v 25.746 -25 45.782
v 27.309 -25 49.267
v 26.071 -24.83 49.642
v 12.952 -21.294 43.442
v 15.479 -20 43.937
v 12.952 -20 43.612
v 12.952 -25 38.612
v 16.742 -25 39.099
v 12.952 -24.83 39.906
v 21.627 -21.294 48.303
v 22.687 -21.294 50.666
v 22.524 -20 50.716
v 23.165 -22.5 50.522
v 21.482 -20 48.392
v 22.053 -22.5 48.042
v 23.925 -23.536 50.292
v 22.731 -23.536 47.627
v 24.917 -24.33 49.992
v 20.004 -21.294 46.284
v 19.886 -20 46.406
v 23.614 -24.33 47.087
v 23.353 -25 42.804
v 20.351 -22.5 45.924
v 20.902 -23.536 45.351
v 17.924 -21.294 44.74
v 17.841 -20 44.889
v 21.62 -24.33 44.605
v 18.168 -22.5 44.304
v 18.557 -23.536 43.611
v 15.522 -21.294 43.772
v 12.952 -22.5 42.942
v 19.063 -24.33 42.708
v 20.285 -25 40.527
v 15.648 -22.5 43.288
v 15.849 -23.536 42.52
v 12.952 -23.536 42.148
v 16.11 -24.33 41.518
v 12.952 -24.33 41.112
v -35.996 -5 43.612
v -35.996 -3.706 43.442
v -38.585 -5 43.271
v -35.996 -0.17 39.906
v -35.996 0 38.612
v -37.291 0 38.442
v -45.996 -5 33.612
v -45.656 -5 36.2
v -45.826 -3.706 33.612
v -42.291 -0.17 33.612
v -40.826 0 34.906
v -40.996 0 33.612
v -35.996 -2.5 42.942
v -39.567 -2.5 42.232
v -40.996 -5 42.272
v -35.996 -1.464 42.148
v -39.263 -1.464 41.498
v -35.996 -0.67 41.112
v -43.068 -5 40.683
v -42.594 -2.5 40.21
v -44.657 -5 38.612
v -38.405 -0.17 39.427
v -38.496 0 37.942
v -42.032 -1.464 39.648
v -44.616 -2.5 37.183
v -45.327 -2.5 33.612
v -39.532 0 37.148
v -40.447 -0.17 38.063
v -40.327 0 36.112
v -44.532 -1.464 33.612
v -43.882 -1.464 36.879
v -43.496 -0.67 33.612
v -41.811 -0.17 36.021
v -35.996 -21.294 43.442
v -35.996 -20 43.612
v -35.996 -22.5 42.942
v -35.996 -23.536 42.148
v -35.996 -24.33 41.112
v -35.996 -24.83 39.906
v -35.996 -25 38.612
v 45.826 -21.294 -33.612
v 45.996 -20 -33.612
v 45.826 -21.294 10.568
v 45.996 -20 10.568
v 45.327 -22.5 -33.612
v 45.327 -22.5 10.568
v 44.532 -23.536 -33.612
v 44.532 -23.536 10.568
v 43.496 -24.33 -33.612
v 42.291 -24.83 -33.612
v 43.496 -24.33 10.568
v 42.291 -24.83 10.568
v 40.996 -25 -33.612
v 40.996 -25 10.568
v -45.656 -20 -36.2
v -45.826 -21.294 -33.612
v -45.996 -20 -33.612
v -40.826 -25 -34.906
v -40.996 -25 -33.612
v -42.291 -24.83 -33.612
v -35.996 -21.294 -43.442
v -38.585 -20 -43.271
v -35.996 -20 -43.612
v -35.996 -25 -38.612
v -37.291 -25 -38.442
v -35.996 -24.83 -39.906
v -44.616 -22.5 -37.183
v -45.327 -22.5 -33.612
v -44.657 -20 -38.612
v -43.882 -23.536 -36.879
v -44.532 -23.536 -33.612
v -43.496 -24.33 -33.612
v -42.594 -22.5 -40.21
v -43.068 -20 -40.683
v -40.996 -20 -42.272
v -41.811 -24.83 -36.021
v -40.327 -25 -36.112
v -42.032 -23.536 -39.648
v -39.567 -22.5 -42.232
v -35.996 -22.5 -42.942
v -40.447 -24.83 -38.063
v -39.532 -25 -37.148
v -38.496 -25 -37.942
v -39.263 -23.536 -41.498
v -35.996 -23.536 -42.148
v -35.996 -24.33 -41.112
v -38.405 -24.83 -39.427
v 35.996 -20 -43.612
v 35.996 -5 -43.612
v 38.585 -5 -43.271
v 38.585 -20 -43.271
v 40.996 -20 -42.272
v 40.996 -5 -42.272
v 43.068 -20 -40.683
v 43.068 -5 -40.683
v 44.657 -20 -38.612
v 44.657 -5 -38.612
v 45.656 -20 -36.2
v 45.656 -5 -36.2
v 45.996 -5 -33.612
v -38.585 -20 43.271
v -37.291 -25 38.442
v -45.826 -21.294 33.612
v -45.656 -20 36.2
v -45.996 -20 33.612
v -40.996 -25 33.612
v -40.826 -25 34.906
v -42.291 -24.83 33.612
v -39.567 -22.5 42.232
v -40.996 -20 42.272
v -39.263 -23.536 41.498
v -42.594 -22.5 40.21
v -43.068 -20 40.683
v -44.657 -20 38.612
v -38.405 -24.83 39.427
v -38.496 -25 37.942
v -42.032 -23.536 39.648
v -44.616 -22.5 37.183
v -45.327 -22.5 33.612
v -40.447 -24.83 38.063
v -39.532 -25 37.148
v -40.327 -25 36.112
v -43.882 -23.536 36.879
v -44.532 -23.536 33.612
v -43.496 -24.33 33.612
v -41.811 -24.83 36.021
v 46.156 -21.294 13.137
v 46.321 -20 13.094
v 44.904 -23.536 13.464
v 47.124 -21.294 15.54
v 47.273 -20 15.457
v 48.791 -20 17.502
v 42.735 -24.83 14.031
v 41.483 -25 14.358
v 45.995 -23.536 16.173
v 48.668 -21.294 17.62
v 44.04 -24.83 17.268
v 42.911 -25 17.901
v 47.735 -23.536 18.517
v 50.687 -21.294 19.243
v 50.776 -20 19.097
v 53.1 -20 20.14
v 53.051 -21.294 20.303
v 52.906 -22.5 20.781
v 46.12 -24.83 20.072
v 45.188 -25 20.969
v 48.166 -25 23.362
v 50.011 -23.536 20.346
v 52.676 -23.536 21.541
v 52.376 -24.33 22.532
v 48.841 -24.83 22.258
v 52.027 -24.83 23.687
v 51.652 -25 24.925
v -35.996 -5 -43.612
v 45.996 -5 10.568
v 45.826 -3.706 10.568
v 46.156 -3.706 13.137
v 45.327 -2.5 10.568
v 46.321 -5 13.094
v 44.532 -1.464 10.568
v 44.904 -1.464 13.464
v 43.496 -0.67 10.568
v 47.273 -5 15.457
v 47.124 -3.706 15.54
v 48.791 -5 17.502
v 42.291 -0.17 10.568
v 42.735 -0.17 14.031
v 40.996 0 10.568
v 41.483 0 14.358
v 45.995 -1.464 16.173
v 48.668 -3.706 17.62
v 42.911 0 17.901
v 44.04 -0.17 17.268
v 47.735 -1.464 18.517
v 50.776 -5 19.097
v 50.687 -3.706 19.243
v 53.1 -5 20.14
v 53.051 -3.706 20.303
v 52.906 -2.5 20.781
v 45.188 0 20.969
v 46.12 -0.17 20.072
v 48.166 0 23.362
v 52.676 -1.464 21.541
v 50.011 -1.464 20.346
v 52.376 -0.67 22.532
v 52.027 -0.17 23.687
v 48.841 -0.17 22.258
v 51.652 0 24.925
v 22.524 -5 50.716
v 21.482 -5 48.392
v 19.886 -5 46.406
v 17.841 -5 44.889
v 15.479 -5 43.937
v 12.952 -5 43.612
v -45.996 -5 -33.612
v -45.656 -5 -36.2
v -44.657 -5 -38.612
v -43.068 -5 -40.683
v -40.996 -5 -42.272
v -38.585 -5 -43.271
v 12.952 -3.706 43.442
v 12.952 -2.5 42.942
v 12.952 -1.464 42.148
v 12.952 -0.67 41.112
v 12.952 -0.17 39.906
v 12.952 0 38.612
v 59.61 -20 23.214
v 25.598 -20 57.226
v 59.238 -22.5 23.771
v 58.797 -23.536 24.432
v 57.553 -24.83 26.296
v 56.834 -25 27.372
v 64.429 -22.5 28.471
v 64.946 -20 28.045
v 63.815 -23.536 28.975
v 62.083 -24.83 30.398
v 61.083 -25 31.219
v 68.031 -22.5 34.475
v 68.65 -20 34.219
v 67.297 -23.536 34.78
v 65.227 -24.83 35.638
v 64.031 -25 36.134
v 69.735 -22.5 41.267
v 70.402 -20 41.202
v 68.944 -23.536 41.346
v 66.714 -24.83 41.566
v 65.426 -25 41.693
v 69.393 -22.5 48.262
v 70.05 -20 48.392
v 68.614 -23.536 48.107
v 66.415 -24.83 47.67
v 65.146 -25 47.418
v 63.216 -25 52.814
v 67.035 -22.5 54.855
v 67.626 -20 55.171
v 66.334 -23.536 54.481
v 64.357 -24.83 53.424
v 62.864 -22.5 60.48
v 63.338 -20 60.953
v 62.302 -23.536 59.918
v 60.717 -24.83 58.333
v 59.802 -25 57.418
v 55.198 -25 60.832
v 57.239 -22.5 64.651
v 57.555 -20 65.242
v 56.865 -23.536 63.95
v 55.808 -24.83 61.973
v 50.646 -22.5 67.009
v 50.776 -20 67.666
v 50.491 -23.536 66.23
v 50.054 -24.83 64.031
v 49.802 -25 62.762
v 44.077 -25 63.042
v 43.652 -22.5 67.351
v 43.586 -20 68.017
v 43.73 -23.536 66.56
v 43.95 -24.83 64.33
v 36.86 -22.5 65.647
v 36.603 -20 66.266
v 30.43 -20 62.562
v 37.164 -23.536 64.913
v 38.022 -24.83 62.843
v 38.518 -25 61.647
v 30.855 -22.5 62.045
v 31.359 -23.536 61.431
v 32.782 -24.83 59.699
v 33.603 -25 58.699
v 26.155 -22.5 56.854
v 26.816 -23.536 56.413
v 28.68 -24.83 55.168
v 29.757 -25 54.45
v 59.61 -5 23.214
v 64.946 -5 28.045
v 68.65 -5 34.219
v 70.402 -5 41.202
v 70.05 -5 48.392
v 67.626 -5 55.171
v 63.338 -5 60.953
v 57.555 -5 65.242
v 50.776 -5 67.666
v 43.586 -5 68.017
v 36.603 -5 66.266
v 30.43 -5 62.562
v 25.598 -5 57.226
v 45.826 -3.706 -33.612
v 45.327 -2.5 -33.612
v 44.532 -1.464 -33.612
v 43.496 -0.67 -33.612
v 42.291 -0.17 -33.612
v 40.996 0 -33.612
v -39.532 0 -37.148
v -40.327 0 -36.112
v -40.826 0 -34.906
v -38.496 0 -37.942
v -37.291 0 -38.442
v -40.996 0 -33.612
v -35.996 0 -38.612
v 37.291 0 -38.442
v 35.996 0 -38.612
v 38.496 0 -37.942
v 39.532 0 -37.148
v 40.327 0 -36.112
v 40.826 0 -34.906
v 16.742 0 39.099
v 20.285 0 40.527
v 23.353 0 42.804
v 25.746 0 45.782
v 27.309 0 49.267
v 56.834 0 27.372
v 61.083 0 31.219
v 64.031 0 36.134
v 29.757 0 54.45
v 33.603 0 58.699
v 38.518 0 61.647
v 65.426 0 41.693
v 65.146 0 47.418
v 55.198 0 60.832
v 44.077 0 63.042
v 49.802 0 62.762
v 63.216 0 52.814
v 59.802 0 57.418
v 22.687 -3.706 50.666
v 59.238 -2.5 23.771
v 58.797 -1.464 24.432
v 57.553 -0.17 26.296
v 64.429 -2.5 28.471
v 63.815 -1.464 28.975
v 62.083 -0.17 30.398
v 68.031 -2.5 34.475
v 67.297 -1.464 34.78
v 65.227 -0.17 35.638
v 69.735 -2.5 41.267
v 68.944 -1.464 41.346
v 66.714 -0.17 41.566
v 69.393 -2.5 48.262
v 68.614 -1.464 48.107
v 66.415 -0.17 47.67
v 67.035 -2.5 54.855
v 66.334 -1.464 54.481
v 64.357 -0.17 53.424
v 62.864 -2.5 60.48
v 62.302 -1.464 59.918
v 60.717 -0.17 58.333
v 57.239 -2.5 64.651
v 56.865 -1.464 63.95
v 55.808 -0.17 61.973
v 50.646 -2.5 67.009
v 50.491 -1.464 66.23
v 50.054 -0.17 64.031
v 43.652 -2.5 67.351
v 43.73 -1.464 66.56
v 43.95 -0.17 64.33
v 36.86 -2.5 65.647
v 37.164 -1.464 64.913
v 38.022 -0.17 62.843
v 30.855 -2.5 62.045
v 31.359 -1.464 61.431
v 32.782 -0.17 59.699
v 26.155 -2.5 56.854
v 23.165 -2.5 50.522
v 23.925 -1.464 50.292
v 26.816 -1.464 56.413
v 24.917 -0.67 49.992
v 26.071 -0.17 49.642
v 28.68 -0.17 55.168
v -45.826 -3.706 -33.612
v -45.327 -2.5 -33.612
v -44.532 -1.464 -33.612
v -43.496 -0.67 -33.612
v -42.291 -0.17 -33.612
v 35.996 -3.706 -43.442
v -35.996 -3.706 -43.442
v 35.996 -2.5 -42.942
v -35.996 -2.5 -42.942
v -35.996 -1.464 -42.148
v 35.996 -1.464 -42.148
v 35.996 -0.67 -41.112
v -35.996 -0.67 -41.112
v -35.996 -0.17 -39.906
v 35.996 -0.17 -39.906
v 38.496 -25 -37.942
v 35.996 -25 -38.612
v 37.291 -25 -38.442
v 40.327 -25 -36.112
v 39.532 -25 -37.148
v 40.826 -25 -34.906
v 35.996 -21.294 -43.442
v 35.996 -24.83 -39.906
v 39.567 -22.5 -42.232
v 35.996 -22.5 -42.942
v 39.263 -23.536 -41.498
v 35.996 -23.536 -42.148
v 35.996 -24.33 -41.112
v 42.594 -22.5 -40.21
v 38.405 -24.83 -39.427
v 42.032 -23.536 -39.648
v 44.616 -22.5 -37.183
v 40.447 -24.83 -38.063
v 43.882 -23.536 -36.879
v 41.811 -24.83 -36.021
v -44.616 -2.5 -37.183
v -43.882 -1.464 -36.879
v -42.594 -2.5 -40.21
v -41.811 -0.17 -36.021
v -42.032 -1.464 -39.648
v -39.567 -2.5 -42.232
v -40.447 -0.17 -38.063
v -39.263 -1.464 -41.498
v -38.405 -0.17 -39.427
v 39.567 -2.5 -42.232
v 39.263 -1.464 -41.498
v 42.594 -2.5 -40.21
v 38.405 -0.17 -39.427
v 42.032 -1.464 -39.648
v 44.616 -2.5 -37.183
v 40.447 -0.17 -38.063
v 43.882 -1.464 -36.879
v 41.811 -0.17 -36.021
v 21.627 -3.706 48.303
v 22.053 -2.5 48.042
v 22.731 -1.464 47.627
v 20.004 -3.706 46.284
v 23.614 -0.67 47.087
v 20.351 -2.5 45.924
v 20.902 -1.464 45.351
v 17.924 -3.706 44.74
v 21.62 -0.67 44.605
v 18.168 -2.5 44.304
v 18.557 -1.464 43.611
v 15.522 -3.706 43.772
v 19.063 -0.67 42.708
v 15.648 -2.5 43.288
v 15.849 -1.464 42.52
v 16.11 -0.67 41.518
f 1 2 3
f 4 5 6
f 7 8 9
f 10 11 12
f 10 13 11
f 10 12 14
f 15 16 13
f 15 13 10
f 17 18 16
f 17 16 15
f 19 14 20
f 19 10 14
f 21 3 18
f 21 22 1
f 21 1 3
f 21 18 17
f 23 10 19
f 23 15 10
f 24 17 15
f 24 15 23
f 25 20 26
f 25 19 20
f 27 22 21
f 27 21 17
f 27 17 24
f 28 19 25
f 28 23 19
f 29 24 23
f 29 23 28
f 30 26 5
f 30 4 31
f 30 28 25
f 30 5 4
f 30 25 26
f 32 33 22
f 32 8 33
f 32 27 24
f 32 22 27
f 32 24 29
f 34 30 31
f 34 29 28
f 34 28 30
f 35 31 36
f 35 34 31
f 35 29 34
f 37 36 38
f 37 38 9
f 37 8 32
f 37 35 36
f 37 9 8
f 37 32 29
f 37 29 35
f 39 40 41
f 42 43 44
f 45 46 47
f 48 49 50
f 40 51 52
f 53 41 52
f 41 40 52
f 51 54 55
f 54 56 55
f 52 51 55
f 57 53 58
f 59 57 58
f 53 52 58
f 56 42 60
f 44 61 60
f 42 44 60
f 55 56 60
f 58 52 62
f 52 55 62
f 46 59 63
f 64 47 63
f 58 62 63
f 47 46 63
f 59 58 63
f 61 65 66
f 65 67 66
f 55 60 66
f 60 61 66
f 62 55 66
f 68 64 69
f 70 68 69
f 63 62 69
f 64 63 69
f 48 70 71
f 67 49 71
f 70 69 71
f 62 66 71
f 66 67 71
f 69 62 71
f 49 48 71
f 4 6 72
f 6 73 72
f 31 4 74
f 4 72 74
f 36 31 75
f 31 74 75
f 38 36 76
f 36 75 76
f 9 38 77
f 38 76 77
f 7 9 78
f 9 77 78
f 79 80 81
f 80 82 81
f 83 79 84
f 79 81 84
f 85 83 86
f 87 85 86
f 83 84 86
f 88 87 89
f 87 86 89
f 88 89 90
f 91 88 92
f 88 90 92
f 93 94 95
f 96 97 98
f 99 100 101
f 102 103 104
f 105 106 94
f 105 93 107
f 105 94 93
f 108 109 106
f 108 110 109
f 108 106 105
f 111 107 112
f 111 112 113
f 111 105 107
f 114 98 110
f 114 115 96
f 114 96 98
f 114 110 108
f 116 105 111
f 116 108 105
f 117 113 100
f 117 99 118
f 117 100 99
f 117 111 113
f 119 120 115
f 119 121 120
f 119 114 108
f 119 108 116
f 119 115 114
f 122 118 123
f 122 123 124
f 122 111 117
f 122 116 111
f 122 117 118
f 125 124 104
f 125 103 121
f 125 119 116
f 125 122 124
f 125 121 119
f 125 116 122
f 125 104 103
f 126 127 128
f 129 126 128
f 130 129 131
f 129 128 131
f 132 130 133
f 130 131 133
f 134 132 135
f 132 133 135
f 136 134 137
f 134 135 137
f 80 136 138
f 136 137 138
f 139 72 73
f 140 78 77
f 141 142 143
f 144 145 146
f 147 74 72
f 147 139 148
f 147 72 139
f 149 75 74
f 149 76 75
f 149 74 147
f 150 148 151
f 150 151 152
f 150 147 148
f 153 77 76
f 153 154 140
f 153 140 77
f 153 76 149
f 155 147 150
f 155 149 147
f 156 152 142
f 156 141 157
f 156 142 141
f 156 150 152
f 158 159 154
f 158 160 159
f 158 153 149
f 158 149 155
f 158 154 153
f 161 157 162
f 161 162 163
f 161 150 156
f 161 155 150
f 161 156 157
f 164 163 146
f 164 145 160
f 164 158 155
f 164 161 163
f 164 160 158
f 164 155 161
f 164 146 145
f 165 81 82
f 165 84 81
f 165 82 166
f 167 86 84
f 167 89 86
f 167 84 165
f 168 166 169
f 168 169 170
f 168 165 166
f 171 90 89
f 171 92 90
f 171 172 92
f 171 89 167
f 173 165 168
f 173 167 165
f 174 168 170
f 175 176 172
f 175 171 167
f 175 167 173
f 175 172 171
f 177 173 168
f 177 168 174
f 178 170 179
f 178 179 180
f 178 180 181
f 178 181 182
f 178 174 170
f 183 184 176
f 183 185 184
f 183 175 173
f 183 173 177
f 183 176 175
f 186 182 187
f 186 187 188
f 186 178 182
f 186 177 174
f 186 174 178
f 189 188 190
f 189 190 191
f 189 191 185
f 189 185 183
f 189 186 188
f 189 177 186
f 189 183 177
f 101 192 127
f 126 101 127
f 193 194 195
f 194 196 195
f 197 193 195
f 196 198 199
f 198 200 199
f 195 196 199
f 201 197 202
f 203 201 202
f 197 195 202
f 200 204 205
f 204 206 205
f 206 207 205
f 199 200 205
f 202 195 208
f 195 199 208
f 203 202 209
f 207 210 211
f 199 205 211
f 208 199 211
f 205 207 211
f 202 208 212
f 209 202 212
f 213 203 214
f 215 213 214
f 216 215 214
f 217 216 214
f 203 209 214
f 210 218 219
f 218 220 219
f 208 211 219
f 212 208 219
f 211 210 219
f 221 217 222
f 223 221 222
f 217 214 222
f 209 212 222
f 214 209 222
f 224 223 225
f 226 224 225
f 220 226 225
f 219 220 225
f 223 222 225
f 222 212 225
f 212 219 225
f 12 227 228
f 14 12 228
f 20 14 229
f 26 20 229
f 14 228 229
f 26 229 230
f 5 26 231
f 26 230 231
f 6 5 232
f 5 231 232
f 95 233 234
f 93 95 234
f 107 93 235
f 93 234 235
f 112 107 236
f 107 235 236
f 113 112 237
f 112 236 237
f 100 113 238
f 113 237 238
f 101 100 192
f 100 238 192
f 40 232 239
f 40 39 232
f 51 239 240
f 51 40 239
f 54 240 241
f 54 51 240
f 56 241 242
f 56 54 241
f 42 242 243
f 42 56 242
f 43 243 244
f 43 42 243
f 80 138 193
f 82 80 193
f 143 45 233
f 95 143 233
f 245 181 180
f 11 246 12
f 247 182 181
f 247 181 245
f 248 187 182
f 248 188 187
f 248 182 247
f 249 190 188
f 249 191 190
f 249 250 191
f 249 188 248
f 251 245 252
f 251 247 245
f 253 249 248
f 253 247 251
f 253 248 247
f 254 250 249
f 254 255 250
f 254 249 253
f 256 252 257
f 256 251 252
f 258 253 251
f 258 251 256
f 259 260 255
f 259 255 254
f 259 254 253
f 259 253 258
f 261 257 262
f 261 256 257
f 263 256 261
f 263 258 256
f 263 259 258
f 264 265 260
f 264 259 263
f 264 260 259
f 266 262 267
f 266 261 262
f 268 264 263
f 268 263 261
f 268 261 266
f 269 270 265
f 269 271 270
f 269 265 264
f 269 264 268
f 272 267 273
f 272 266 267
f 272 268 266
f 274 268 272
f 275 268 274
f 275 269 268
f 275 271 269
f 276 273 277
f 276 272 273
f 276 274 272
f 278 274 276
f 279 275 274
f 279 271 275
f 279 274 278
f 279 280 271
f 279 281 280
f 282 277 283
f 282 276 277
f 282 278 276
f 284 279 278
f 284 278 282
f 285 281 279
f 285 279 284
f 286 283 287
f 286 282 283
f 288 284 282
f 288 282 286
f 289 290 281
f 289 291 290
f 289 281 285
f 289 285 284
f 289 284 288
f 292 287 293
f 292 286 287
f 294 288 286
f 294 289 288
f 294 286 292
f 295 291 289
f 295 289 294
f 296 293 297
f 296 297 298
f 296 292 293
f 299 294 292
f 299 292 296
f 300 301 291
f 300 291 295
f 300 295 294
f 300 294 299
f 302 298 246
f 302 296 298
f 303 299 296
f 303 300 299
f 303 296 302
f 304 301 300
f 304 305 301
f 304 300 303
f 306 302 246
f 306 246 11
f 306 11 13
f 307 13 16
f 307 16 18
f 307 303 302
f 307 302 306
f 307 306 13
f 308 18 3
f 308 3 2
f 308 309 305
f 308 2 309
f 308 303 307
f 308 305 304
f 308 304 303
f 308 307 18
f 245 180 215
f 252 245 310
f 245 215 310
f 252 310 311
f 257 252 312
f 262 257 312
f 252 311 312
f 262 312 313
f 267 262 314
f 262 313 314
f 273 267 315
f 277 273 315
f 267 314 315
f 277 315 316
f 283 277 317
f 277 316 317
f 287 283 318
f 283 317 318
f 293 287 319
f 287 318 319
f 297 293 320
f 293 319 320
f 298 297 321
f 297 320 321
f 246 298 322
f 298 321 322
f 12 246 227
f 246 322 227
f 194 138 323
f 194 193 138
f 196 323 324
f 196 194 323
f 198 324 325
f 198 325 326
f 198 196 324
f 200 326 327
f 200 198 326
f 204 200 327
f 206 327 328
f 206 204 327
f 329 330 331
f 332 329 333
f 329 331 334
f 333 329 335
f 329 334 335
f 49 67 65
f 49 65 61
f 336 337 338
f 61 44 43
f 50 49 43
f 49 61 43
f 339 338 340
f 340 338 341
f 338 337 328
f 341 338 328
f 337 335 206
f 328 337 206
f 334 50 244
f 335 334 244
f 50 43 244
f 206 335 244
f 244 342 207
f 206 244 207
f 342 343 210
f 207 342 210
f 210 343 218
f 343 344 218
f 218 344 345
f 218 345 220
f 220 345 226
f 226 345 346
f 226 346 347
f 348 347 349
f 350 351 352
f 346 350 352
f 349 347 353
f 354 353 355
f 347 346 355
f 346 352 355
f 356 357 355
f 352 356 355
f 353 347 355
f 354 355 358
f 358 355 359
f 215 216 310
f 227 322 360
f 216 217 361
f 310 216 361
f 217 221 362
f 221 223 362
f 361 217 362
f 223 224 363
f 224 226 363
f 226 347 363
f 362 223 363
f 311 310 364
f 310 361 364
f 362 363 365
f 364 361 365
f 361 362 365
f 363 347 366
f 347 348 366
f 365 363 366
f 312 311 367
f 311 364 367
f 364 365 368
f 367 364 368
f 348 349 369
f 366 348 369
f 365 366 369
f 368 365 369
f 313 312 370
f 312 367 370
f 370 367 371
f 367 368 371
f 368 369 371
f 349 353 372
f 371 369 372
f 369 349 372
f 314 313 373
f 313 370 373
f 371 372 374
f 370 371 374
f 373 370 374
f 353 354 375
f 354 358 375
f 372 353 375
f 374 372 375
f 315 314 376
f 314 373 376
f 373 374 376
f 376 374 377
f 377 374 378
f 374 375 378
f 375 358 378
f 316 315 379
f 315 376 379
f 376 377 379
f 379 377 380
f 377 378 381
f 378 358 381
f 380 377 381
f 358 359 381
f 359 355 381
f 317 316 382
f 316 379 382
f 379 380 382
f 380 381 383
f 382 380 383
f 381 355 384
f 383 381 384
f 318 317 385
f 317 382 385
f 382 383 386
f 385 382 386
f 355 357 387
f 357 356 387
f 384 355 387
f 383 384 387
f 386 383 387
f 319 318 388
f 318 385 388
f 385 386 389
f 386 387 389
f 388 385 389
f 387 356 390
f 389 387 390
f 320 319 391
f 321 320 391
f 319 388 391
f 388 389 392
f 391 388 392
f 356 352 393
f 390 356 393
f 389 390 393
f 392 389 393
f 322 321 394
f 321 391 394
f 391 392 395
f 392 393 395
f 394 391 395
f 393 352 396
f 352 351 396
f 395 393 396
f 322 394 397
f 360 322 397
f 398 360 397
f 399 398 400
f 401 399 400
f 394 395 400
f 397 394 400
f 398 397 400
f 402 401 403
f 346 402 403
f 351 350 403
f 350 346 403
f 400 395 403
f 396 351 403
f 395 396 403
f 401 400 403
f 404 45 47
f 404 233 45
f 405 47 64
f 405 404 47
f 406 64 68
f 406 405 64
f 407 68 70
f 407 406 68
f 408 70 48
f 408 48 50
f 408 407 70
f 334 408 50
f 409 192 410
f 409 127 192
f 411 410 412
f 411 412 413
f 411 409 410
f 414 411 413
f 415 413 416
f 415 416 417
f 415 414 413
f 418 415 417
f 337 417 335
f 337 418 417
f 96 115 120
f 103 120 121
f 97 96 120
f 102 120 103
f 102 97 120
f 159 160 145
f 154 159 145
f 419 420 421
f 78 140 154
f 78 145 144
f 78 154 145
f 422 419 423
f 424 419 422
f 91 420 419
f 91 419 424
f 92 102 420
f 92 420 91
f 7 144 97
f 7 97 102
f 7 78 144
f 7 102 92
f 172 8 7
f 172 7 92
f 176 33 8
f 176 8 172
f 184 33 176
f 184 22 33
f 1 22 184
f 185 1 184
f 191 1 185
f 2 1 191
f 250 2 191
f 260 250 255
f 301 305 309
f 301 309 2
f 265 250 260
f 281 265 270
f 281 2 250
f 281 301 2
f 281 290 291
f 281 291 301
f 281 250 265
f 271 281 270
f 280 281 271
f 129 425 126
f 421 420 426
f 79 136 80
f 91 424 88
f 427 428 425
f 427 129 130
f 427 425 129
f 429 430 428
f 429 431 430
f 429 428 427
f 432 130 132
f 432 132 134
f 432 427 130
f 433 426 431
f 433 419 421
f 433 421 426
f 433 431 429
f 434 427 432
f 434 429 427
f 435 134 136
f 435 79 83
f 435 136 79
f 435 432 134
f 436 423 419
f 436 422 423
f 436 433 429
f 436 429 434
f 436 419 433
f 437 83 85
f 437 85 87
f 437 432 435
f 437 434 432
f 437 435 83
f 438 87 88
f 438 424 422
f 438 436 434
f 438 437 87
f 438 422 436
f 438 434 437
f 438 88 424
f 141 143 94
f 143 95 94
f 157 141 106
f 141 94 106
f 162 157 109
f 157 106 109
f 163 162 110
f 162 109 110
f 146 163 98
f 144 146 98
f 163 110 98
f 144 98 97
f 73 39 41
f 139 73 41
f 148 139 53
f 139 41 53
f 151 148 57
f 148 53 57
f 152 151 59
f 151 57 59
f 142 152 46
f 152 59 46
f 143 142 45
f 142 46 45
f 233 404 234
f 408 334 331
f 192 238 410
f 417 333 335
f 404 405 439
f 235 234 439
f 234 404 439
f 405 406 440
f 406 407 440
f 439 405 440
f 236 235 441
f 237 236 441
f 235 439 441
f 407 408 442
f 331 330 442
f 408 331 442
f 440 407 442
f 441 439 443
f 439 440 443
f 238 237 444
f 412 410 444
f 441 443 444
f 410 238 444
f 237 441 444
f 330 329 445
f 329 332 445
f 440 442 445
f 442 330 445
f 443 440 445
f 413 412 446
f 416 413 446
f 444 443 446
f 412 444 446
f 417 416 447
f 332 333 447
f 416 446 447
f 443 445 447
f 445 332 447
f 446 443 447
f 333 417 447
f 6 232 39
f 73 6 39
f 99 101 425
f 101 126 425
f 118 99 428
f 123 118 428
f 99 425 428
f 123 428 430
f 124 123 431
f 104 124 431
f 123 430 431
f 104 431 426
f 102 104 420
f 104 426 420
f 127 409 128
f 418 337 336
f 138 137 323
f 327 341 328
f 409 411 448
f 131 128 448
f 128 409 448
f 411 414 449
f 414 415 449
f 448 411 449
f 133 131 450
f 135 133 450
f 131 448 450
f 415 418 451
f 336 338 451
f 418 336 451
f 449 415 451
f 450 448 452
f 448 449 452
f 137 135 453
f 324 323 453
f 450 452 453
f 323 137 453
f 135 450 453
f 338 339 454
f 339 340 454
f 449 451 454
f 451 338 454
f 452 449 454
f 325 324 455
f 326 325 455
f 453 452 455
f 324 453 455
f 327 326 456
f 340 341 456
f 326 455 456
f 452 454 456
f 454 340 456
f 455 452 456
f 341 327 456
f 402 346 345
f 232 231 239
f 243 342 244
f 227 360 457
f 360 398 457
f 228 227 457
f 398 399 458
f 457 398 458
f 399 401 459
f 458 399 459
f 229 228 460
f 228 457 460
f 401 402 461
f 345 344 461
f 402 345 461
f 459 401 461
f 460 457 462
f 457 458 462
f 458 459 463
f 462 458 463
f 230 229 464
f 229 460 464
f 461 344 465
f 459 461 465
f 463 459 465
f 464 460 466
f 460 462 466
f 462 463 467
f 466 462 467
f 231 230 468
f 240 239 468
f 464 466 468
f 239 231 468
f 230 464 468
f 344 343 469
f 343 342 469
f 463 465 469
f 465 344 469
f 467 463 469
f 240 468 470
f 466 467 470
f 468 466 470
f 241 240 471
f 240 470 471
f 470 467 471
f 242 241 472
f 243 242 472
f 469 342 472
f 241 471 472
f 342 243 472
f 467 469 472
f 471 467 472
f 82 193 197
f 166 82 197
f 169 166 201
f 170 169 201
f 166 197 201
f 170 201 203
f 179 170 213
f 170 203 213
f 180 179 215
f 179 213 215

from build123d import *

# Parameters (mm, degrees)
F1_DEPTH = 25
F2_R     = 5


# Not quite as in the source:
# - the program builds the solid bodies; features that only make, move or delete a surface that nothing else refers to are left out


with BuildPart() as f1:
    # F0 (on Front) → F1 (new body)
    with BuildSketch(Plane.XZ):
        with BuildLine():
            ThreePointArc((22.5237740783, 50.7157030305), (18.9120996382, 45.5821277938), (12.9524584639, 43.6122384452))
            Line((12.9524584639, 43.6122384452), (-35.9964722395, 43.6122384452))
            ThreePointArc((-35.9964722395, 43.6122384452), (-43.0675400514, 40.6833062571), (-45.9964722395, 33.6122384452))
            Line((-45.9964722395, 33.6122384452), (-45.9964722395, -33.6122384452))
            ThreePointArc((-45.9964722395, -33.6122384452), (-43.0675400514, -40.6833062571), (-35.9964722395, -43.6122384452))
            Line((-35.9964722395, -43.6122384452), (35.9964722395, -43.6122384452))
            ThreePointArc((35.9964722395, -43.6122384452), (43.0675400514, -40.6833062571), (45.9964722395, -33.6122384452))
            Line((45.9964722395, -33.6122384452), (45.9964722395, 10.5682246696))
            ThreePointArc((45.9964722395, 10.5682246696), (47.9663615881, 16.5278658439), (53.0999368248, 20.139540284))
            ThreePointArc((53.0999368248, 20.139540284), (63.3375617105, 60.9533279162), (22.5237740783, 50.7157030305))
        make_face()
    extrude(amount=F1_DEPTH)

    # F2
    f2_edges = [f1.edges().sort_by_distance(p)[0] for p in [
        (63.337562, -25, 60.953328),
        (63.337562, 0, 60.953328),
    ]]
    fillet(f2_edges, radius=F2_R)


solid = f1.part
